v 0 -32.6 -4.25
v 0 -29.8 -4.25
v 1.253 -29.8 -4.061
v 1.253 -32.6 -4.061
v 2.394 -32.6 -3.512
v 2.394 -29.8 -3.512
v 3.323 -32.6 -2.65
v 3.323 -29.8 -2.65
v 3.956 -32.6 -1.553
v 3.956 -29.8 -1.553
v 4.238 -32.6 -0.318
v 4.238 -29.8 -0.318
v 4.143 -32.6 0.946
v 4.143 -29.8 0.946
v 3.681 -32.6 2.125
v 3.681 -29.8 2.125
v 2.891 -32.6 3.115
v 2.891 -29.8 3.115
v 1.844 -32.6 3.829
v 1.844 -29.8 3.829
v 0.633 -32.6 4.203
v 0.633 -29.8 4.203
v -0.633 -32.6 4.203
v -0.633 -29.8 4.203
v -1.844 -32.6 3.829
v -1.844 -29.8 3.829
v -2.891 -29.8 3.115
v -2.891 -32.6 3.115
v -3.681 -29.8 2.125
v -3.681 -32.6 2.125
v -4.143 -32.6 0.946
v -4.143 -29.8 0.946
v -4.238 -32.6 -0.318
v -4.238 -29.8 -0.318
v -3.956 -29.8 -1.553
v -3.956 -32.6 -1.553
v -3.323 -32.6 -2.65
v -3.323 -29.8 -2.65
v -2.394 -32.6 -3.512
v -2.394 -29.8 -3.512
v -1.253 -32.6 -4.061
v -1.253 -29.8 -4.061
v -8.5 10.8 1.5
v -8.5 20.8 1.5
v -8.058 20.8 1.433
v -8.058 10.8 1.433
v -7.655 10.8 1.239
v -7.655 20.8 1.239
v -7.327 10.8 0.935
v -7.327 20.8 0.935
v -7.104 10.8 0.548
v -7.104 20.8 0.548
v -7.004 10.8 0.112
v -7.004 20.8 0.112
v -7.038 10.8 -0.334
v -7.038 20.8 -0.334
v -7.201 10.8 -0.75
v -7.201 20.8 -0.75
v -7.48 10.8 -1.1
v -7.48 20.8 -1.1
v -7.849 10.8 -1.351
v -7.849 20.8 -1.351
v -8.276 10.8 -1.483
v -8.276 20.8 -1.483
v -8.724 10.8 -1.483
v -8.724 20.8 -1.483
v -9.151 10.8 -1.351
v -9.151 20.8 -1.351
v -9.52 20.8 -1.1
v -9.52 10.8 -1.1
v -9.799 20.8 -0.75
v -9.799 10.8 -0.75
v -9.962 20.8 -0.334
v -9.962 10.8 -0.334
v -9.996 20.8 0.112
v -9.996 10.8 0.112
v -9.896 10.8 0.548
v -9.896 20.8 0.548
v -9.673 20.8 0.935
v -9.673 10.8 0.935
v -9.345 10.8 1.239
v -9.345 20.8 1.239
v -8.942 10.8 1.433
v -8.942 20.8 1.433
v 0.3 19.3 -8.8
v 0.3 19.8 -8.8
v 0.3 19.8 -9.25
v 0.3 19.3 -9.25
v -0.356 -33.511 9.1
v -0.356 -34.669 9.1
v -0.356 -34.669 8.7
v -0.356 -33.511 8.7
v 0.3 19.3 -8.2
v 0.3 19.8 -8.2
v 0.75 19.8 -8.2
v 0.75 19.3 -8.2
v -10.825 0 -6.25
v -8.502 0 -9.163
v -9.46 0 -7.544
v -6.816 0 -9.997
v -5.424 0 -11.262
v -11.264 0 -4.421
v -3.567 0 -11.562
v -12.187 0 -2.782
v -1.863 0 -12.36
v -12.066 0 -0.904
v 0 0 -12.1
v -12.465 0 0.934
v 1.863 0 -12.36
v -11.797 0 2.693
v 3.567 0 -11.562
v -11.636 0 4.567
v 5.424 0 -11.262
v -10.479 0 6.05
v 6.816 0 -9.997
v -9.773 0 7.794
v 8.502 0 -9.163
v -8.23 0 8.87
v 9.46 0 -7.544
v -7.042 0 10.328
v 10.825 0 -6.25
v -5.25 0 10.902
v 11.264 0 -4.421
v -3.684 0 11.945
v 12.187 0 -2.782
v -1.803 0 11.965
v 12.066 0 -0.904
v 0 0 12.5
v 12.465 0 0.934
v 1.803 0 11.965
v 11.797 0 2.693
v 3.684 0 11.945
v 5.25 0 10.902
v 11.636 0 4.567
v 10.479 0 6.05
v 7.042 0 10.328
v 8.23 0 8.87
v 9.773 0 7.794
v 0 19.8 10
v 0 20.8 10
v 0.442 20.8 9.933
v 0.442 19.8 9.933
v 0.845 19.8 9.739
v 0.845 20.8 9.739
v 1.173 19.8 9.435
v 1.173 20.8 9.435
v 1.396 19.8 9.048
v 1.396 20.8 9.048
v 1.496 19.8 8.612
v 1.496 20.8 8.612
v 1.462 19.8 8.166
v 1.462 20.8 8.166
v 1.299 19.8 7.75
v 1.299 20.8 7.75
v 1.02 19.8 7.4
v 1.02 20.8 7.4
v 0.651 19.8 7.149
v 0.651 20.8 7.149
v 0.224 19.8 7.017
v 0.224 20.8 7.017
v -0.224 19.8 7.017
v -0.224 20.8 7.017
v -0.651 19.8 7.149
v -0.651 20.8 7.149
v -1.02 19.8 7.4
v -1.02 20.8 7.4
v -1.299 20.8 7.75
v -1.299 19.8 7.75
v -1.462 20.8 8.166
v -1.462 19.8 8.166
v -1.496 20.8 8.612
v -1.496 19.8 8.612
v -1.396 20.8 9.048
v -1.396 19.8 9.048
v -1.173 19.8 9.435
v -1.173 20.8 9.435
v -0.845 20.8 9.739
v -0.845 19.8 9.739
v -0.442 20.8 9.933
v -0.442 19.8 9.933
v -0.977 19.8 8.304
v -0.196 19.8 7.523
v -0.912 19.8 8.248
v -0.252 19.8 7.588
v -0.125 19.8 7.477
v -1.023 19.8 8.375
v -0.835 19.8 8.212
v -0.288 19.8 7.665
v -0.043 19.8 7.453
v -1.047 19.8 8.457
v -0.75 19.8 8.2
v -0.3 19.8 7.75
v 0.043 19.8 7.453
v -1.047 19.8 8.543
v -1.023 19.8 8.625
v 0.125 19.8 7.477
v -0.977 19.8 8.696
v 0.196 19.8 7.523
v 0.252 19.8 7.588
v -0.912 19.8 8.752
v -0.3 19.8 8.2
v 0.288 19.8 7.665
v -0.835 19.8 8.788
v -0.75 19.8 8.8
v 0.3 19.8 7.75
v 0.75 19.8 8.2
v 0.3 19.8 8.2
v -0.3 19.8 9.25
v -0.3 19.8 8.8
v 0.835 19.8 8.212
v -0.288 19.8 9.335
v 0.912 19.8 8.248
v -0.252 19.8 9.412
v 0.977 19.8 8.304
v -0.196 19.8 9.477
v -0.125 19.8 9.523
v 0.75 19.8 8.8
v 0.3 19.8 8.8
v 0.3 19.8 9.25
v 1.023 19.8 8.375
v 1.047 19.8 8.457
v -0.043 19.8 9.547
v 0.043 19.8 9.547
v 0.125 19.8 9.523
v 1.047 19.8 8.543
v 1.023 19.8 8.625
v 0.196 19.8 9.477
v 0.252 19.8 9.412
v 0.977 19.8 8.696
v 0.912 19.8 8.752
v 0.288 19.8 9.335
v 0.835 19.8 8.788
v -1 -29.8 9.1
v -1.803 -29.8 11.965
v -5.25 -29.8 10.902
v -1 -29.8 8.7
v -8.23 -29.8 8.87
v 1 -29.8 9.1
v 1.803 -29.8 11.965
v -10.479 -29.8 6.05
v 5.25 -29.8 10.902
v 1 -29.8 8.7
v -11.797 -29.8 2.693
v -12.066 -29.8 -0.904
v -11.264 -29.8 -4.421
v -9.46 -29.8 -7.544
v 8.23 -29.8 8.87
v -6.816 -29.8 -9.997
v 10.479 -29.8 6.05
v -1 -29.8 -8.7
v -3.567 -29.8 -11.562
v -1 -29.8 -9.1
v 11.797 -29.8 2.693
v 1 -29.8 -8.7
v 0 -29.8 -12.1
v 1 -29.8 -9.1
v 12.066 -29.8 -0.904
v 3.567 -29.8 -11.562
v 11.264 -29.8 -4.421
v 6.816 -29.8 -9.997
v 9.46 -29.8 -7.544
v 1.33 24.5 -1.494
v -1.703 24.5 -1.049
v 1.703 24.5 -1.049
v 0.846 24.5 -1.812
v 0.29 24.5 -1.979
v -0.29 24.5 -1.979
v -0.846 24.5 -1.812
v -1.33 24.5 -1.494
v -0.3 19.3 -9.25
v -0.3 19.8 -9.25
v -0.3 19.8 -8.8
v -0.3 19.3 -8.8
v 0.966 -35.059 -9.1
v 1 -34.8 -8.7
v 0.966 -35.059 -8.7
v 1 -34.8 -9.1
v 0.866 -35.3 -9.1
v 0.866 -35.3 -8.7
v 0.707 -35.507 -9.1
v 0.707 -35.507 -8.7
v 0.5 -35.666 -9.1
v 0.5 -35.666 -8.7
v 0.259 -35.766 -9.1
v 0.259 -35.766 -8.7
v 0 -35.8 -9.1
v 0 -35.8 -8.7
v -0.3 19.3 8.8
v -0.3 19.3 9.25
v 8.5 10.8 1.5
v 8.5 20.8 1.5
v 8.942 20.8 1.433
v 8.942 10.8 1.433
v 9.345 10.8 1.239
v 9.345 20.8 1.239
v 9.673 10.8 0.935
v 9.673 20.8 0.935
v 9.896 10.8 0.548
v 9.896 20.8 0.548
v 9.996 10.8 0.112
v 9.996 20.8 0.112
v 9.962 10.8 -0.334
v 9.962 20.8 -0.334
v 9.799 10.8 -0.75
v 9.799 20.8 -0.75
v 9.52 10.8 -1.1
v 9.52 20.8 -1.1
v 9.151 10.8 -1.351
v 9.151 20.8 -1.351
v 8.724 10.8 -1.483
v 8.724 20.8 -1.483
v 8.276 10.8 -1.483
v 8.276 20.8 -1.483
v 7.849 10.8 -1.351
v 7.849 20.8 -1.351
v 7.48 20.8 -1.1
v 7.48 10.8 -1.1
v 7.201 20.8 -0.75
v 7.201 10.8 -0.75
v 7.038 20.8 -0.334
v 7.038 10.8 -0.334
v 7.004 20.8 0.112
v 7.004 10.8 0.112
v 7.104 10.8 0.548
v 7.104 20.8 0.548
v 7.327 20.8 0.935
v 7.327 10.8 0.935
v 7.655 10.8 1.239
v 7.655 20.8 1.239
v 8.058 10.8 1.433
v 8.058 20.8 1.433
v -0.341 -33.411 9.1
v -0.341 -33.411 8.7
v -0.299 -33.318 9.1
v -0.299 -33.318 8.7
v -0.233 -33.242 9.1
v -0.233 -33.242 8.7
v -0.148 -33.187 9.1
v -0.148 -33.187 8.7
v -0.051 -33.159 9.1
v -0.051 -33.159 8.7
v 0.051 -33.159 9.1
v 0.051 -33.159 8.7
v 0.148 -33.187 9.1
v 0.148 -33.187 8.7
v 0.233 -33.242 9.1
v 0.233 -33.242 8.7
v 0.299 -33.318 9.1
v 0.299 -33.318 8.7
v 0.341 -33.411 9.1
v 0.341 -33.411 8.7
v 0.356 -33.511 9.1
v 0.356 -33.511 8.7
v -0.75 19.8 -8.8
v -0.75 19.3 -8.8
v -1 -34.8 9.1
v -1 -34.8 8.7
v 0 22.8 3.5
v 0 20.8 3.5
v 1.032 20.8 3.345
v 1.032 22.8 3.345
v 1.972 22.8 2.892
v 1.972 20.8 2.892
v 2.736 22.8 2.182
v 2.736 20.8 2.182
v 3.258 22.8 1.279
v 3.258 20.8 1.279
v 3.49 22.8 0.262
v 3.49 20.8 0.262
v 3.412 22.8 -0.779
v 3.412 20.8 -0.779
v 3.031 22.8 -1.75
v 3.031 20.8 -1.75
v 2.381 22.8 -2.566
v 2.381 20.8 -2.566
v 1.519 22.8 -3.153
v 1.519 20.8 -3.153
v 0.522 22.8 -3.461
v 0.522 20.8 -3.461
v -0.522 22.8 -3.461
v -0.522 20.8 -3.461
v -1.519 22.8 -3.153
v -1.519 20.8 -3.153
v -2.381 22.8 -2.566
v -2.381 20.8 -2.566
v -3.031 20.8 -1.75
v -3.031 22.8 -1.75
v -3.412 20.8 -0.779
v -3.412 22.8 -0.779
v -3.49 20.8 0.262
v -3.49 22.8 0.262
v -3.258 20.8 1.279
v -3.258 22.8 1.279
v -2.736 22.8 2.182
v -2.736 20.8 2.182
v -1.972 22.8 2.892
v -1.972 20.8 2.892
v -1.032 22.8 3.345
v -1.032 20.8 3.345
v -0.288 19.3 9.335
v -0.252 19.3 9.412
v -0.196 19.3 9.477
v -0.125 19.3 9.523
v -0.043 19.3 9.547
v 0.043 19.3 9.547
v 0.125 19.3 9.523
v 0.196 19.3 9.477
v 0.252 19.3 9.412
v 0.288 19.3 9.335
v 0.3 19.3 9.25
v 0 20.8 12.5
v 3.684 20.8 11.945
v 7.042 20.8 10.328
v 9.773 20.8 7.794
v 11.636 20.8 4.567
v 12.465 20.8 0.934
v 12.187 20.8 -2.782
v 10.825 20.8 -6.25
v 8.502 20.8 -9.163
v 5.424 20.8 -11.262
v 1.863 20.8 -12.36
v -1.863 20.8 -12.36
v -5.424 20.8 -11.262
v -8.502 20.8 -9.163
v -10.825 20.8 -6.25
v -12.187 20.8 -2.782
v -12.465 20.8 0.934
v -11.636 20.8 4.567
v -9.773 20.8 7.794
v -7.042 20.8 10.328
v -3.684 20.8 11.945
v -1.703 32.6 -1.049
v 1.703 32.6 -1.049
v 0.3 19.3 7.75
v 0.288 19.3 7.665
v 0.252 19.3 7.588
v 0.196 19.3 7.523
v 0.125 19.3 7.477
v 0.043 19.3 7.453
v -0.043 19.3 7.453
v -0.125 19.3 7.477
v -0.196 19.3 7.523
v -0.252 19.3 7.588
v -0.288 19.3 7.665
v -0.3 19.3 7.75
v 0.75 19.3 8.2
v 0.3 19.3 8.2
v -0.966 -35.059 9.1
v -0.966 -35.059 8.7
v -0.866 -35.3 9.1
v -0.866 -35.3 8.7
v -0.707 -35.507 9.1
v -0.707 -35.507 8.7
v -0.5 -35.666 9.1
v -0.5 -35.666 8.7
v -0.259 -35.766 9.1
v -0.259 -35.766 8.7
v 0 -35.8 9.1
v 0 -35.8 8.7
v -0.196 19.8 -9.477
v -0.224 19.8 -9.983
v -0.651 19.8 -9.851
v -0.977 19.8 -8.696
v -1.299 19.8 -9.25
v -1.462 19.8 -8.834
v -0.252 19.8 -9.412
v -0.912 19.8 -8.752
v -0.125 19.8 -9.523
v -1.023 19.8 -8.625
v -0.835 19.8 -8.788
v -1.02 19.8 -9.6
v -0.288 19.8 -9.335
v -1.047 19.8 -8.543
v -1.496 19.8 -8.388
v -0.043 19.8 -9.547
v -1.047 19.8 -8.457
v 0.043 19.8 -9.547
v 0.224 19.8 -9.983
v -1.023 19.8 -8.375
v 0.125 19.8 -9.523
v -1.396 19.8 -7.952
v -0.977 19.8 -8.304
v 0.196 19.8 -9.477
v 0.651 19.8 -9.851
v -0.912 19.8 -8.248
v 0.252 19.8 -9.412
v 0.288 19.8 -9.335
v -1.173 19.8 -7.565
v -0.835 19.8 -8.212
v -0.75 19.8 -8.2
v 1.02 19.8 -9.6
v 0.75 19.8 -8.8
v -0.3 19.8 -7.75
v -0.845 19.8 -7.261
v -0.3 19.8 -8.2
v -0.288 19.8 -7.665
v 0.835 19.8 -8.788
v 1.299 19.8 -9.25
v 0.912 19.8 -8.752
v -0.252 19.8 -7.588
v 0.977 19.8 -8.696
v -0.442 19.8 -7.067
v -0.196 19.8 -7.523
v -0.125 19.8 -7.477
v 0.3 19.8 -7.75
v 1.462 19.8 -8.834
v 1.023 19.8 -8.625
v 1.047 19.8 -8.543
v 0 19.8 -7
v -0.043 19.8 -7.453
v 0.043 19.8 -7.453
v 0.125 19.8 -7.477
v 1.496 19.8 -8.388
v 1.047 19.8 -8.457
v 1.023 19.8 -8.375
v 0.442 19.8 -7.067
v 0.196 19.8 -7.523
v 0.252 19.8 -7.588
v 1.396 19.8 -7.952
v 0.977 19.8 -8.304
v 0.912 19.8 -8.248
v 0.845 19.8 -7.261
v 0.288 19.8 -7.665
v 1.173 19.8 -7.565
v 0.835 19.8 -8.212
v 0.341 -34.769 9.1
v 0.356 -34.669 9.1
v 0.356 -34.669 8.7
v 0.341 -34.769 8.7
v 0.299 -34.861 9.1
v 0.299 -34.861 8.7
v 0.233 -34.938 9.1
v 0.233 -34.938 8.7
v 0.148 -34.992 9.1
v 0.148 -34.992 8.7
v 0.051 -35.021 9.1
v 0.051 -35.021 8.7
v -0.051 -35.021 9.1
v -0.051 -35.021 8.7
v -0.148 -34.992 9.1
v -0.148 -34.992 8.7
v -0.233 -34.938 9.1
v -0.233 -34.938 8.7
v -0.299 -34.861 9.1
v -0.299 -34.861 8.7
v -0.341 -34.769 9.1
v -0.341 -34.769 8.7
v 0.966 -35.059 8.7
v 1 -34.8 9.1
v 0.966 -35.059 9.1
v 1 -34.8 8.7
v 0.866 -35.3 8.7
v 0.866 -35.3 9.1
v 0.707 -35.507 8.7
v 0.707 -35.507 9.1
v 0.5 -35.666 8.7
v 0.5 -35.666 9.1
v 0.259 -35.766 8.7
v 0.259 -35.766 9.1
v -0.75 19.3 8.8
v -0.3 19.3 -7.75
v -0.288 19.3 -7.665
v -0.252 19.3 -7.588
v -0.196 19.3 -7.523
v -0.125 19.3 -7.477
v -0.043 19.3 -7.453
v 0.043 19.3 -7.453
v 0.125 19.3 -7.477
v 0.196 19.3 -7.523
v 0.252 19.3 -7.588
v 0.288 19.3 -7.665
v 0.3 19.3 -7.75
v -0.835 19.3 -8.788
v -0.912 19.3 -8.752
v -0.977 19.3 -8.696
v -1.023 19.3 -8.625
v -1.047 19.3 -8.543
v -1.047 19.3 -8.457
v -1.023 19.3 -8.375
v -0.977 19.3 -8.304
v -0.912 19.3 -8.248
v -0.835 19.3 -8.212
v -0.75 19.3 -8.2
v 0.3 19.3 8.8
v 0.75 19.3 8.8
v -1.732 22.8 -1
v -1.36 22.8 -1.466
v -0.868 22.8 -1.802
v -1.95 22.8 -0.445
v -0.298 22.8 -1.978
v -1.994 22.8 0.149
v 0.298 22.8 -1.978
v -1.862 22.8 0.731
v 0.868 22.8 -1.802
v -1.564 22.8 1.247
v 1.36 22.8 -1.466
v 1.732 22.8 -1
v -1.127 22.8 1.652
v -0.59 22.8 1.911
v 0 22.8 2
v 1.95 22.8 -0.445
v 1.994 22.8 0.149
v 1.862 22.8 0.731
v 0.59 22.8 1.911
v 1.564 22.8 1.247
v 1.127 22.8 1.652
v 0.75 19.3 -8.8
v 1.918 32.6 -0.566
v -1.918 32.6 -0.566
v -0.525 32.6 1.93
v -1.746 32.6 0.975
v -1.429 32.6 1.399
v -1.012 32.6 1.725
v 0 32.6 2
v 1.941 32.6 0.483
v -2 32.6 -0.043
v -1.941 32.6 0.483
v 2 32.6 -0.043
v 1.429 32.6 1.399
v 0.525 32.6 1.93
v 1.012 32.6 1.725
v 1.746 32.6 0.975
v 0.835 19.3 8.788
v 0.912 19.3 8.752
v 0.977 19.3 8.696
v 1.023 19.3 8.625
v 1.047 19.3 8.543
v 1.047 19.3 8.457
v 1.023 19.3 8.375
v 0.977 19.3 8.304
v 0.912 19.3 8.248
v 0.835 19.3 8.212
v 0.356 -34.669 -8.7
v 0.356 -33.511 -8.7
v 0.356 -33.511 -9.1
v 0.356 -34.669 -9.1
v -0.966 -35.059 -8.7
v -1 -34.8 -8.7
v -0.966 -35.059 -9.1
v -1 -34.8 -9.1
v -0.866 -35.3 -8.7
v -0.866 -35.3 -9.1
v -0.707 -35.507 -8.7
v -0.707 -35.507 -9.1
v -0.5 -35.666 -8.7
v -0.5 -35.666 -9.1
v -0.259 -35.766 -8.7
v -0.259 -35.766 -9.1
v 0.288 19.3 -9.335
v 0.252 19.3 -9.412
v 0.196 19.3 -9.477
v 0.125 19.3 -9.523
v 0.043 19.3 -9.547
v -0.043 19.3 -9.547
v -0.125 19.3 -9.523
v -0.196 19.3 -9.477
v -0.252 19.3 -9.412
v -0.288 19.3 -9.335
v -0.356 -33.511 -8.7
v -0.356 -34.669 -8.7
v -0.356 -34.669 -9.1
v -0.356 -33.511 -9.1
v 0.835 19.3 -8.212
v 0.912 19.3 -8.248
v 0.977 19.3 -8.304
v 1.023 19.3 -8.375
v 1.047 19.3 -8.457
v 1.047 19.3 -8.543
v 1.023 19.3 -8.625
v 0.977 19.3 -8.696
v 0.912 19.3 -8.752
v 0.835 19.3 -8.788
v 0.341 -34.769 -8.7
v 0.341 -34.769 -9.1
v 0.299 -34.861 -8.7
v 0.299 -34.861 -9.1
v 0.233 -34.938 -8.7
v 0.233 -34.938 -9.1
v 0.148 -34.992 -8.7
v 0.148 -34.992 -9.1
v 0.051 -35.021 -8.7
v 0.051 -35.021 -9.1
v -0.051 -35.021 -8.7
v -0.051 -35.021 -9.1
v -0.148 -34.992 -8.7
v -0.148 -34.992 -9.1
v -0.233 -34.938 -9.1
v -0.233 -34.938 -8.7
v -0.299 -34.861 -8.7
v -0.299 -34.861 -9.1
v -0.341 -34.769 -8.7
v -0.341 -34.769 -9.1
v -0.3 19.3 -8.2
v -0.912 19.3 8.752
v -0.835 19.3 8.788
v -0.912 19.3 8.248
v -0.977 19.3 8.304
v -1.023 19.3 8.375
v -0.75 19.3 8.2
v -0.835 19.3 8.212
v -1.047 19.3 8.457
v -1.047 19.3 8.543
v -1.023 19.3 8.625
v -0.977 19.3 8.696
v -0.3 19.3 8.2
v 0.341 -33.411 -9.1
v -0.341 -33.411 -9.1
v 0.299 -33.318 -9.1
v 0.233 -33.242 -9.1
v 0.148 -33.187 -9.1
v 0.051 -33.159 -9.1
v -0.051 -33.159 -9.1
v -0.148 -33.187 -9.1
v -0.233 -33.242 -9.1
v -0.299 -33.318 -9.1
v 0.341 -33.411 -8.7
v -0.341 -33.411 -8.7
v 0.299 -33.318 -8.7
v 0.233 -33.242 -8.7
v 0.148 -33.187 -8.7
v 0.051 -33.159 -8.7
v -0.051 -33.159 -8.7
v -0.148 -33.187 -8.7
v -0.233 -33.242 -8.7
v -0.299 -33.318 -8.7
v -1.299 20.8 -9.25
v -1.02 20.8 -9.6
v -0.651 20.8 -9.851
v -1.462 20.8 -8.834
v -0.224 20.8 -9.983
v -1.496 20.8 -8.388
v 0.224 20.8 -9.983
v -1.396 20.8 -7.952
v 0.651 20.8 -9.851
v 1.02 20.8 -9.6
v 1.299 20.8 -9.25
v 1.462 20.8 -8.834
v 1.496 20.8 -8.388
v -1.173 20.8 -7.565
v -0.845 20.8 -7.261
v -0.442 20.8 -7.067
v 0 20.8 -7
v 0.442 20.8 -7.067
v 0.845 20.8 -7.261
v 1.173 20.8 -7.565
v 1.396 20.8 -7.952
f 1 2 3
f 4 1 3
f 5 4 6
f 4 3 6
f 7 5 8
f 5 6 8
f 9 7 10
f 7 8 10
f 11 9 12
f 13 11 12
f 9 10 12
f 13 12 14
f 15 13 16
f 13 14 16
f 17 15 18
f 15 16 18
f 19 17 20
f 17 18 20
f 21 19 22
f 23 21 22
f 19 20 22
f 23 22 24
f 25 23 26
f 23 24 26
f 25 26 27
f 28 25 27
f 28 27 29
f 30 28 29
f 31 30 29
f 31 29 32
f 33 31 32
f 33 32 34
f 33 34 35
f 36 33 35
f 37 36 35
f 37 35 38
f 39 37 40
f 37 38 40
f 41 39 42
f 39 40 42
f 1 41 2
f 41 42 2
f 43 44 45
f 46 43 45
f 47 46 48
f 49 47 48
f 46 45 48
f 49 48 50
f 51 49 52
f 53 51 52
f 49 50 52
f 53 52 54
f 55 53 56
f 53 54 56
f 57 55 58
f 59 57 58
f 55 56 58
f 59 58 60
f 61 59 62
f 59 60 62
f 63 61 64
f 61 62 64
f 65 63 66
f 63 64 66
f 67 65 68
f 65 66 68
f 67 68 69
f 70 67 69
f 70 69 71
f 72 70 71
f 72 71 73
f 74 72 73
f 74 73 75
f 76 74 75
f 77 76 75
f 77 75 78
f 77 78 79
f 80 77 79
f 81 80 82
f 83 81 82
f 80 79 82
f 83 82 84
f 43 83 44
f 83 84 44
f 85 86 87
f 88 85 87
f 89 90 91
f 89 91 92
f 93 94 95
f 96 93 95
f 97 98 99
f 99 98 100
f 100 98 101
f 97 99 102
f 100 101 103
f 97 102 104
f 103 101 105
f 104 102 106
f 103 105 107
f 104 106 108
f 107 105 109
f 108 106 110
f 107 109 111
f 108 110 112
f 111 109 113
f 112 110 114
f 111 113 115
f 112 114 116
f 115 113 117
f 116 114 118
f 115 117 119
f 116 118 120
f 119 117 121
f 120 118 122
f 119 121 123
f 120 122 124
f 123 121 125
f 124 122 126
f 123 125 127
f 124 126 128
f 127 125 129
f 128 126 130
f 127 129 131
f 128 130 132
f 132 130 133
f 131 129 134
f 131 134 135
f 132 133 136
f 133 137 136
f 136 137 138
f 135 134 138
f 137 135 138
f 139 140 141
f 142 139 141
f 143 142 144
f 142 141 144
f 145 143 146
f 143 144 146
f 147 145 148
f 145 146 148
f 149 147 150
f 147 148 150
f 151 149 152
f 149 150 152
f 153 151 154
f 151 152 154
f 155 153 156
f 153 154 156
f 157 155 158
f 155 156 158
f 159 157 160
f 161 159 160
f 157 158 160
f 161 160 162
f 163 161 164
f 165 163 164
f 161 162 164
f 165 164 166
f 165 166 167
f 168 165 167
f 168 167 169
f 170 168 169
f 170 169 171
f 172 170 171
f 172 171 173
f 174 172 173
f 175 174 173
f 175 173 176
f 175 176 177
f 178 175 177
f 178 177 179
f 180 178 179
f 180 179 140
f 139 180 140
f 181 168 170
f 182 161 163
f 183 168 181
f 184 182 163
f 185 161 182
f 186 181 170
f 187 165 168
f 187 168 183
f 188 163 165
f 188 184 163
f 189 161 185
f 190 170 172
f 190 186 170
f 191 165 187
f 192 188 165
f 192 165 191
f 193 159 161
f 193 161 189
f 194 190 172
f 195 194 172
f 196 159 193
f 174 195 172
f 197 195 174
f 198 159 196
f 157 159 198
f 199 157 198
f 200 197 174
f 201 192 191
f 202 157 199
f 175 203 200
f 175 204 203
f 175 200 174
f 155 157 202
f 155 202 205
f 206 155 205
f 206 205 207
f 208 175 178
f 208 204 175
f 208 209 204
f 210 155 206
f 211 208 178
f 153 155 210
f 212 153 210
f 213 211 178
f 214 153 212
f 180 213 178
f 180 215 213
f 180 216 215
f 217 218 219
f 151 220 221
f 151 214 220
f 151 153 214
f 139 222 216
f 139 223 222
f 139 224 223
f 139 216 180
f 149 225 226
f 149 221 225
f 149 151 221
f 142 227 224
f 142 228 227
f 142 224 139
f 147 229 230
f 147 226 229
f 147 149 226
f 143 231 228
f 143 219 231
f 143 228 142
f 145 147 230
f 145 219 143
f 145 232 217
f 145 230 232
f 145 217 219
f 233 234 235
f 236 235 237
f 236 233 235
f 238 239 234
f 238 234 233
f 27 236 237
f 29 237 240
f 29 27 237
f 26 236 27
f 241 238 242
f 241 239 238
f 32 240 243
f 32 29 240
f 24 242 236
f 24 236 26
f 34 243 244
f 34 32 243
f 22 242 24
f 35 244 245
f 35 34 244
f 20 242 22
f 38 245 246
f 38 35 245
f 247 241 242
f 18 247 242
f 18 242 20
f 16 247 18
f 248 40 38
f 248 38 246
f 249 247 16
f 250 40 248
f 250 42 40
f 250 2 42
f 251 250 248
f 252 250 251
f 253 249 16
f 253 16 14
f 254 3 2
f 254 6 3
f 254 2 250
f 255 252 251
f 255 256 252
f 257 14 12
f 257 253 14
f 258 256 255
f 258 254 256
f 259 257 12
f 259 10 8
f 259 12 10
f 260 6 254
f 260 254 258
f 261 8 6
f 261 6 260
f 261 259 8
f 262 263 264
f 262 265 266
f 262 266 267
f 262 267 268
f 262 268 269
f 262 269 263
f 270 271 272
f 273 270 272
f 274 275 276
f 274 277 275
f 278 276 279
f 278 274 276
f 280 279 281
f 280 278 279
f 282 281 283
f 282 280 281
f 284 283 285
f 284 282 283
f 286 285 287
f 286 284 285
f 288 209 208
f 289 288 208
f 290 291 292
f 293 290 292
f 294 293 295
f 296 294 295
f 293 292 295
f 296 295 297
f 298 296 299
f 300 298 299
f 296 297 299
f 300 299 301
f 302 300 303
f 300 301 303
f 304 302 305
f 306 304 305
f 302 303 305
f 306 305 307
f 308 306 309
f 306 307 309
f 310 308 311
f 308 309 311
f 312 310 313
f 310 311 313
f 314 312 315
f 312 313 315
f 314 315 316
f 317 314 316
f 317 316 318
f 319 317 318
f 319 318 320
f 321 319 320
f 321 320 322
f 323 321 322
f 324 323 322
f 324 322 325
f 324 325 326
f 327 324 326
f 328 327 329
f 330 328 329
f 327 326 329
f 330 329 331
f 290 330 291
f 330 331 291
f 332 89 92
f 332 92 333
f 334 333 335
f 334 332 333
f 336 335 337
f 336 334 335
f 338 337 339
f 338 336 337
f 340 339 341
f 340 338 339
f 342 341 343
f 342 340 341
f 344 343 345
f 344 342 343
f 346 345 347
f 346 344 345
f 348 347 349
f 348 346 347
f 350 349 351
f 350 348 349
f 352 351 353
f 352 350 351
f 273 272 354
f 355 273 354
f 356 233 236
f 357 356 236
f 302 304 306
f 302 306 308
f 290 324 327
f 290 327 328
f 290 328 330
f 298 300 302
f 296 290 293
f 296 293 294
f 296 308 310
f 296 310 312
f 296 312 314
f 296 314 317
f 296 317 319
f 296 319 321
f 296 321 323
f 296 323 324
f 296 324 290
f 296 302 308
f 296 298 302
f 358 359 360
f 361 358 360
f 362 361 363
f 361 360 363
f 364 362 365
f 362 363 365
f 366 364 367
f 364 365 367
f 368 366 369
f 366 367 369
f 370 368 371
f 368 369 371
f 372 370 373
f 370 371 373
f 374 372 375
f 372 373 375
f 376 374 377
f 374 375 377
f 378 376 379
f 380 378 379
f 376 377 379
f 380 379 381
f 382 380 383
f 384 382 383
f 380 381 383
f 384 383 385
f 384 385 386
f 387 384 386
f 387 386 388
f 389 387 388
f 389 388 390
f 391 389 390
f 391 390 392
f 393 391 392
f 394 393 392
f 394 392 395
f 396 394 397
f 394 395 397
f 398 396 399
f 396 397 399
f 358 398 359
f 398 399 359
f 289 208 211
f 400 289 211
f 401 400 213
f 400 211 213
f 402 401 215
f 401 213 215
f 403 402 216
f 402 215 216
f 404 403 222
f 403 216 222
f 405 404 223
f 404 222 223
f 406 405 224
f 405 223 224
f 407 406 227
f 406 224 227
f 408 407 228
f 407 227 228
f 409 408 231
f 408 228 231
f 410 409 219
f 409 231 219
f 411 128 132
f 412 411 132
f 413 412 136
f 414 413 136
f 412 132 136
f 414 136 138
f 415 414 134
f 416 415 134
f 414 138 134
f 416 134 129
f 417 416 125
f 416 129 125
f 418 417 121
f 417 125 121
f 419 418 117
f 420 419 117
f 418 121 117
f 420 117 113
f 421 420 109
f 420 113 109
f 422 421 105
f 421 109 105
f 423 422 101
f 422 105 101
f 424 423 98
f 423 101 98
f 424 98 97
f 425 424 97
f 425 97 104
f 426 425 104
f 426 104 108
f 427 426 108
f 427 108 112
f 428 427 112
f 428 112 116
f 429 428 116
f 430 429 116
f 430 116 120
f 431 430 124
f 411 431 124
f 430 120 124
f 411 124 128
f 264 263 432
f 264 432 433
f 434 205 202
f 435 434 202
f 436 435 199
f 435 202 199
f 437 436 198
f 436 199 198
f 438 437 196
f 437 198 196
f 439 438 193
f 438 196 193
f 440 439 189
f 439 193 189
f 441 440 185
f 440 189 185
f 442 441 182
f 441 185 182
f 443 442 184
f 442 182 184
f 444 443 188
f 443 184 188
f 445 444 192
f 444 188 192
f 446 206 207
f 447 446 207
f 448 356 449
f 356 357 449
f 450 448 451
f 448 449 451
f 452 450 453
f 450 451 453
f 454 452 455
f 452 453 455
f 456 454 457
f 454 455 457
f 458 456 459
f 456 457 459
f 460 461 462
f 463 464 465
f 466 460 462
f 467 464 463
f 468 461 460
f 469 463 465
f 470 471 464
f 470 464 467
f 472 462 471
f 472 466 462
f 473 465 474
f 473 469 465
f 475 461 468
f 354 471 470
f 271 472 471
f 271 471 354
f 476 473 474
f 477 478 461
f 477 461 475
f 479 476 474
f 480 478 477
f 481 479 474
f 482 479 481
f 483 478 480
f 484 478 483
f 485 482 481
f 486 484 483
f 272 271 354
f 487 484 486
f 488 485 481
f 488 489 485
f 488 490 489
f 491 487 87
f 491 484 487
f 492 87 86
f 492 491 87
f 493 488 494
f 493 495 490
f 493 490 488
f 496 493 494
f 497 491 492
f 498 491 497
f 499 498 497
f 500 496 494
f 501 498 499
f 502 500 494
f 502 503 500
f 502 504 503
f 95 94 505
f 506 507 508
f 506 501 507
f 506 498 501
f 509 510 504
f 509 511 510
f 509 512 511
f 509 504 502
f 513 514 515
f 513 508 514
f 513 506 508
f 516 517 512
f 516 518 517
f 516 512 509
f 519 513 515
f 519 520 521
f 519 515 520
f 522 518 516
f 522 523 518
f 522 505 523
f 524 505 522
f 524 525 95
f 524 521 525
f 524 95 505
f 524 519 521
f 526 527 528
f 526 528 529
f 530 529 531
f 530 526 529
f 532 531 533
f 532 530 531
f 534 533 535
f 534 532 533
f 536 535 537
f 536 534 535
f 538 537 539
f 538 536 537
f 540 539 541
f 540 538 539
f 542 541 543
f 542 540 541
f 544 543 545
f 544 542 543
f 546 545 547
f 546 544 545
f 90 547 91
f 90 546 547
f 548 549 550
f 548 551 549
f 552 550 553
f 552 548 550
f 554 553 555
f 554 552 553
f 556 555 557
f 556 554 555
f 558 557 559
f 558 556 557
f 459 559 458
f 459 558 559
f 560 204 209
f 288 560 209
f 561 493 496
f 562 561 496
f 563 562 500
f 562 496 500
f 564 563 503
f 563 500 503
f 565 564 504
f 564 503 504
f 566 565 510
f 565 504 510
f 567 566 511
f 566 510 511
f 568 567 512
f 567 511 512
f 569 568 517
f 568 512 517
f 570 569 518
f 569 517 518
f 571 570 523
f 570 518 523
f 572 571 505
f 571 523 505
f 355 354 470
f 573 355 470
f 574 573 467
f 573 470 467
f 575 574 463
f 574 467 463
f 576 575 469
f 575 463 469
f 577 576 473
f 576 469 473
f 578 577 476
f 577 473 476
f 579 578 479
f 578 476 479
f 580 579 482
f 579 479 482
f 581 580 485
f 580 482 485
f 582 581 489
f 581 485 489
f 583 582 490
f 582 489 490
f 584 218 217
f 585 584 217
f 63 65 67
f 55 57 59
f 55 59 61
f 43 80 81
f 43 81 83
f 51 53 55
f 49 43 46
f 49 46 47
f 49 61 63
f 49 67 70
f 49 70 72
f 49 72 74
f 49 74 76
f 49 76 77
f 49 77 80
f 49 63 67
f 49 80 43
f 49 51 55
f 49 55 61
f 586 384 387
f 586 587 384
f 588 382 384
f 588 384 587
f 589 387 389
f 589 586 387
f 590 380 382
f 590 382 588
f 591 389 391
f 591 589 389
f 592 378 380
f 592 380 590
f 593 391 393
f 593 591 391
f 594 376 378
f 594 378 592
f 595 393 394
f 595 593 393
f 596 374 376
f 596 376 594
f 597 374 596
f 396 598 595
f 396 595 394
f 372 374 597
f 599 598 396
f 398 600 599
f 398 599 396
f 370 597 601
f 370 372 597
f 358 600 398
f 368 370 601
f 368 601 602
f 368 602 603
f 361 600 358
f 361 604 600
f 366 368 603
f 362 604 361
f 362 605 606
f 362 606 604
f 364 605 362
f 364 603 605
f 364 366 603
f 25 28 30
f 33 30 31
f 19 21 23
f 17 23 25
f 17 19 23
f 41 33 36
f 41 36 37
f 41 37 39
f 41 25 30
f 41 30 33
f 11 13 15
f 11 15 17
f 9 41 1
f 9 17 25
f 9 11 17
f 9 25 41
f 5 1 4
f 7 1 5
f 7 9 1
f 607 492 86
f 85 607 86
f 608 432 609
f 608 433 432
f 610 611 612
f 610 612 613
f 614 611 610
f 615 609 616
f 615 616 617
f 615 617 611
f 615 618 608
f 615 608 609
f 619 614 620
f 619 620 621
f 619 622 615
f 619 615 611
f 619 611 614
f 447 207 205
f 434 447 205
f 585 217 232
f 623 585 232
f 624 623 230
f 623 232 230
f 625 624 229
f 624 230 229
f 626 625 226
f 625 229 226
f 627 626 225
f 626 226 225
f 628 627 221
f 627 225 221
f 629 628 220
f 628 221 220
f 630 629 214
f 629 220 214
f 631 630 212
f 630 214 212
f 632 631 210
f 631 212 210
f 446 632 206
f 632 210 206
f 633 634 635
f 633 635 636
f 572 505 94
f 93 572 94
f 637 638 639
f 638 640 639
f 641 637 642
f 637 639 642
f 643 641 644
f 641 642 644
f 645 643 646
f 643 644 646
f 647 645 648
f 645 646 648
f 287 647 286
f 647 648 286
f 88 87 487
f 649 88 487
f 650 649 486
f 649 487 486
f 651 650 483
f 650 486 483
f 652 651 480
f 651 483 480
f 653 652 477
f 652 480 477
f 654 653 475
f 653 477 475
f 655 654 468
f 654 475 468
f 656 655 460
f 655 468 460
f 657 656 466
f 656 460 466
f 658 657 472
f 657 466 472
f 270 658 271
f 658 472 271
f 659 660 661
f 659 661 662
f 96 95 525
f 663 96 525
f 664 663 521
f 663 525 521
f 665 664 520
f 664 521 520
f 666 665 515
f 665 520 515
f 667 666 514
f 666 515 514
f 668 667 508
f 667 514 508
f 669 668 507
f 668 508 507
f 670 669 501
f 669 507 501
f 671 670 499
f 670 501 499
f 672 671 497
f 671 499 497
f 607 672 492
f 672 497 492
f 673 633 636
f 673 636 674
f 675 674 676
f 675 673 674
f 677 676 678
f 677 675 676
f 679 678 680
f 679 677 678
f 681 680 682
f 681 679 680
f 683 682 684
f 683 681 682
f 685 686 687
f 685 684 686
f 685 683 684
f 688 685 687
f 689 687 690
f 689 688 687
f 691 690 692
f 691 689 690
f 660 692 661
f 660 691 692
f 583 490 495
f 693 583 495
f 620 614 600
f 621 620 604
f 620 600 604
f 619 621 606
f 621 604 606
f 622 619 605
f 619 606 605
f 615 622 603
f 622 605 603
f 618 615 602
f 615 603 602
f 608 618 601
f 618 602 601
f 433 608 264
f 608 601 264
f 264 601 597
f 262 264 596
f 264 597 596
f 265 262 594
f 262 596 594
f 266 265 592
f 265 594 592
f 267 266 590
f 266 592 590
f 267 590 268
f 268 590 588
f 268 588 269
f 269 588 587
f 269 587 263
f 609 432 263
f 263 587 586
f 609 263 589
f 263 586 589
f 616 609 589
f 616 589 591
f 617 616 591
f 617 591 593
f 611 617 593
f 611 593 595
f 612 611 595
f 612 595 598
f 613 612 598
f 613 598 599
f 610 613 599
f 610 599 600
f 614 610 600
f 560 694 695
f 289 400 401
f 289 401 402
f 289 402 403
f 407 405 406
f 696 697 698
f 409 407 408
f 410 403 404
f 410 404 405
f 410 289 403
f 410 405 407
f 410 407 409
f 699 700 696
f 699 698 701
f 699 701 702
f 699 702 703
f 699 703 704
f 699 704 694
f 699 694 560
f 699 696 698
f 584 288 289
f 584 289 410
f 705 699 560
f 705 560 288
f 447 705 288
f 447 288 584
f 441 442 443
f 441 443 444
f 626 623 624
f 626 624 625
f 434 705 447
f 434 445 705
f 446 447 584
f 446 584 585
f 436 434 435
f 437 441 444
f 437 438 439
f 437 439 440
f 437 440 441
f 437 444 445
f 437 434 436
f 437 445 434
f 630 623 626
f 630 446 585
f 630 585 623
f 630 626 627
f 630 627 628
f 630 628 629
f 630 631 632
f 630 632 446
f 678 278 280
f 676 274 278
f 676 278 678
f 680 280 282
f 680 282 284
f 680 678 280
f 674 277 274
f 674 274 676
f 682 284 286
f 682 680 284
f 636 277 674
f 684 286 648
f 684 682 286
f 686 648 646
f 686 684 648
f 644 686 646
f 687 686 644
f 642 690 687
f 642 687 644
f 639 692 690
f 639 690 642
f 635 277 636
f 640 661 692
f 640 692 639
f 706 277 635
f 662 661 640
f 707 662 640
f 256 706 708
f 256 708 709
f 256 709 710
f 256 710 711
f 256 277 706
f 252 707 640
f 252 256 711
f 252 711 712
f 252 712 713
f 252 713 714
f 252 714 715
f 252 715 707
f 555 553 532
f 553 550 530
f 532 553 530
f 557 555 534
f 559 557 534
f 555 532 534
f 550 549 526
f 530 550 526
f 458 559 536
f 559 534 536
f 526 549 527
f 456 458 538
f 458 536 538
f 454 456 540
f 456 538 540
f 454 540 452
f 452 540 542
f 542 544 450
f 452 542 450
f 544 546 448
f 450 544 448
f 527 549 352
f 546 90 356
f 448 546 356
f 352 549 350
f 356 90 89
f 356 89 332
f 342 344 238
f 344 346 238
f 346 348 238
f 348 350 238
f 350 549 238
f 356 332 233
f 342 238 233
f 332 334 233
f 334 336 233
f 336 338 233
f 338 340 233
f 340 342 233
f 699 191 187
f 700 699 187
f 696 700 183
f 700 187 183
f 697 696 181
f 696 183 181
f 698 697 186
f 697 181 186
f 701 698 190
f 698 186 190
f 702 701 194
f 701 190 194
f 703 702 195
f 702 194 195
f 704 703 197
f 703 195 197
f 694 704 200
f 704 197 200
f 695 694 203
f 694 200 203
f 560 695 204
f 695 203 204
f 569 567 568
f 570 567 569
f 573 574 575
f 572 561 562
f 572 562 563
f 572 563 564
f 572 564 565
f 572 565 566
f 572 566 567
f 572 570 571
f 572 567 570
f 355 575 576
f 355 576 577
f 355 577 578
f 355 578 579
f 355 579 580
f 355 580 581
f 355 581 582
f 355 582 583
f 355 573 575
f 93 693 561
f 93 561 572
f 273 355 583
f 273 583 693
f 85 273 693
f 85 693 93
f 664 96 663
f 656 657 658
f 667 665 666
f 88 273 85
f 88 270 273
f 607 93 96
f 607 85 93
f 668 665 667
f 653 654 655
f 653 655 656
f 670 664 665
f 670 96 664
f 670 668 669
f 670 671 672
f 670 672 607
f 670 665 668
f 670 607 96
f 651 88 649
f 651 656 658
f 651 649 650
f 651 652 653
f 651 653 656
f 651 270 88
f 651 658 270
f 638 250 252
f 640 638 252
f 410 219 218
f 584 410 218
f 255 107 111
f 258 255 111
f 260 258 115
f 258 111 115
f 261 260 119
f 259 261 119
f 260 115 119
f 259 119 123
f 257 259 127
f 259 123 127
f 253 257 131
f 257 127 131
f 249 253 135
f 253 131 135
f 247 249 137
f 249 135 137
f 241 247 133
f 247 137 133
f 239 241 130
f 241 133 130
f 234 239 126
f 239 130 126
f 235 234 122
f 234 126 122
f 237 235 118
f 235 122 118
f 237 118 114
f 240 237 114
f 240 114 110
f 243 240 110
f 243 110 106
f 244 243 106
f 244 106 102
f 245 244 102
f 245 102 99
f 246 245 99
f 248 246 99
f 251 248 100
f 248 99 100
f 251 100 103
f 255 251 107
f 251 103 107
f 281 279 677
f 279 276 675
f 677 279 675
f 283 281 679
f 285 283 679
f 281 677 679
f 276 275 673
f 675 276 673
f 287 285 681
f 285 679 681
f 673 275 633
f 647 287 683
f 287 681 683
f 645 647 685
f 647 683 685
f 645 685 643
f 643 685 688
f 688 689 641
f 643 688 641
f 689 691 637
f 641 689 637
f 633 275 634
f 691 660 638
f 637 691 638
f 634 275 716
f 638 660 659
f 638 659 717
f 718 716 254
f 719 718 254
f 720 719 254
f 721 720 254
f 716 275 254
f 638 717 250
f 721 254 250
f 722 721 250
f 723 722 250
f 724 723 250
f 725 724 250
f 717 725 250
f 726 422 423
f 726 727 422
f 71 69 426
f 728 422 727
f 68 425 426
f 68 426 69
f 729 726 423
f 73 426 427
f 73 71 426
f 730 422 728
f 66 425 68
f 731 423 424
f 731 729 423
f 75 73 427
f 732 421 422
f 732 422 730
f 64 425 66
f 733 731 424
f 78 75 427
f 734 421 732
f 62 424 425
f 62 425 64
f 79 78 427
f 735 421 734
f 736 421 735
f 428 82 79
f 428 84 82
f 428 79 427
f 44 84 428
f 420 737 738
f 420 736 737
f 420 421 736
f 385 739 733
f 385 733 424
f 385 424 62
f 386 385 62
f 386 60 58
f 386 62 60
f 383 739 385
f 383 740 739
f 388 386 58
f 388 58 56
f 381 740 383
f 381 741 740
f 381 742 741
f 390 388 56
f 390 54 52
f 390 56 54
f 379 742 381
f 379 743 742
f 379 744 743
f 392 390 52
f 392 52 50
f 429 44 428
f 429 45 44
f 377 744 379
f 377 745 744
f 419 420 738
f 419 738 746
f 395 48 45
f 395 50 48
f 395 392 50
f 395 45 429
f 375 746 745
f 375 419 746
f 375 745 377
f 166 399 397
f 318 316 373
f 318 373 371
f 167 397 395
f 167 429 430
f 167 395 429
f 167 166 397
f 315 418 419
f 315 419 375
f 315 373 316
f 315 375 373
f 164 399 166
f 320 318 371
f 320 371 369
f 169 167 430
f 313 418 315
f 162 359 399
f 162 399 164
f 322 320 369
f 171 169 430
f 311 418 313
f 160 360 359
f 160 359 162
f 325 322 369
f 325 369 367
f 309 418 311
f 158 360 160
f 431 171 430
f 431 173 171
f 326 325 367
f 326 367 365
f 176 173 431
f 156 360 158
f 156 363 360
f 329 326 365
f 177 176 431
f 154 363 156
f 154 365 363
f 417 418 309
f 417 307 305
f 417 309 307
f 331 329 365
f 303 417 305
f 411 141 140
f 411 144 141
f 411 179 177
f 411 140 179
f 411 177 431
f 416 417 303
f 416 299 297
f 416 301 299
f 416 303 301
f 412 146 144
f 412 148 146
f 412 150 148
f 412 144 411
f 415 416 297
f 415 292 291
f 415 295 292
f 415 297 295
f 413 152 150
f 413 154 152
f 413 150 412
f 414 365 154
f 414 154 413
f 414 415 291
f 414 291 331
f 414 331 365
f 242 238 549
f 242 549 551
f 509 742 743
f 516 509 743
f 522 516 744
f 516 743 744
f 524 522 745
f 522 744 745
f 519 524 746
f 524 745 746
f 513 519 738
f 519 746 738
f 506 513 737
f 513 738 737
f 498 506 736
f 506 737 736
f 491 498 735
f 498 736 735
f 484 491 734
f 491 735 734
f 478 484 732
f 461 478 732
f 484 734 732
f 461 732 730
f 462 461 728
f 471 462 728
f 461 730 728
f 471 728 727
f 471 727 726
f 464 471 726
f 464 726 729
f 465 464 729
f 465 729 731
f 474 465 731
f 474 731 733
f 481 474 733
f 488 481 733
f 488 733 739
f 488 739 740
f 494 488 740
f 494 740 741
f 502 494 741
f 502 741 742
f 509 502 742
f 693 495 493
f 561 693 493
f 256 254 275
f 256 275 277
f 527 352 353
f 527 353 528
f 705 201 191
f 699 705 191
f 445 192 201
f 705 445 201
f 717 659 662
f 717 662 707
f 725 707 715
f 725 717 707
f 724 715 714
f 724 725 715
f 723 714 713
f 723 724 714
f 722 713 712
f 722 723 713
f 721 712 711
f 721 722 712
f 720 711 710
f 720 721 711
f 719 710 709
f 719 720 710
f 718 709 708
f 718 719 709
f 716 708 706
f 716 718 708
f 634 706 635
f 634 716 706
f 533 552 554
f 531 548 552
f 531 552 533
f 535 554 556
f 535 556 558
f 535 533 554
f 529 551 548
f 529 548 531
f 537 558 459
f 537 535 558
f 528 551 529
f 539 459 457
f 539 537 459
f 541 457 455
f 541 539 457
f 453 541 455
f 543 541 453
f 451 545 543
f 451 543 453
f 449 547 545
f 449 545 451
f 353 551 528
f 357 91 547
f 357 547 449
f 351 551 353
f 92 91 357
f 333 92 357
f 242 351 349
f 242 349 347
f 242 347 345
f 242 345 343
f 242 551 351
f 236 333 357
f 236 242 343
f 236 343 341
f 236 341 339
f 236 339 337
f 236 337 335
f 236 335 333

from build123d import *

# Parameters (mm, degrees)
ESBO_O1_R                = 12.5
RESSALTO_EXTRUS_O1_DEPTH = 20.8
ESBO_O2_R                = 12.1
RESSALTO_EXTRUS_O2_DEPTH = 29.8
ESBO_O3_R                = 2
RESSALTO_EXTRUS_O3_DEPTH = 11.8
CORTE_EXTRUS_O1_START    = -8.1
CORTE_EXTRUS_O1_DEPTH    = 8.1
ESBO_O5_R                = 3.5
RESSALTO_EXTRUS_O4_DEPTH = 2
ESBO_O6_R                = 1.5
CORTE_EXTRUS_O2_DEPTH    = 10
RESSALTO_EXTRUS_O5_START = 9
ESBO_O8_R                = 1.5
RESSALTO_EXTRUS_O5_DEPTH = 9
CORTE_EXTRUS_O3_DEPTH    = 0.5
ESBO_O10_R               = 4.25
RESSALTO_EXTRUS_O6_DEPTH = 2.8
ESBO_O11_W               = 2
ESBO_O11_H               = 0.4
RESSALTO_EXTRUS_O8_DEPTH = 6
FILETE1_R                = 1
CORTE_EXTRUS_O4_DEPTH    = 22


with BuildPart() as part:
    # Esboço1 → Ressalto-extrusão1 (new body)
    with BuildSketch(Plane(origin=(0, 0, 0), x_dir=(1, 0, 0), z_dir=(0, 1, 0))):
        with Locations(Location((0, 0, 0), (0, 0, 270))):
            Circle(ESBO_O1_R)
    extrude(amount=RESSALTO_EXTRUS_O1_DEPTH)

    # Esboço2 → Ressalto-extrusão2 (add)
    with BuildSketch(Plane(origin=(0, 0, 0), x_dir=(-1, 0, 0), z_dir=(0, -1, 0))):
        with Locations(Location((0, 0, 0), (0, 0, 90))):
            Circle(ESBO_O2_R)
    extrude(amount=RESSALTO_EXTRUS_O2_DEPTH)

    # Esboço3 → Ressalto-extrusão3 (add)
    with BuildSketch(Plane(origin=(0, 20.8, 0), x_dir=(1, 0, 0), z_dir=(0, 1, 0))):
        with Locations(Location((0, 0, 0), (0, 0, 270))):
            Circle(ESBO_O3_R)
    extrude(amount=RESSALTO_EXTRUS_O3_DEPTH)

    # Esboço4 → Corte-extrusão1 (cut)
    with BuildSketch(Plane(origin=(0, 32.6, 0), x_dir=(1, 0, 0), z_dir=(0, 1, 0)).offset(CORTE_EXTRUS_O1_START)):
        with BuildLine():
            Line((-1.702650866, 1.049275955), (1.702650866, 1.049275955))
            ThreePointArc((1.702650866, 1.049275955), (0, 2), (-1.702650866, 1.049275955))
        make_face()
    extrude(amount=CORTE_EXTRUS_O1_DEPTH, mode=Mode.SUBTRACT)

    # Esboço5 → Ressalto-extrusão4 (add)
    with BuildSketch(Plane(origin=(0, 20.8, 0), x_dir=(1, 0, 0), z_dir=(0, 1, 0))):
        with Locations(Location((0, 0, 0), (0, 0, 270))):
            Circle(ESBO_O5_R)
    extrude(amount=RESSALTO_EXTRUS_O4_DEPTH)

    # Esboço6 → Corte-extrusão2 (cut)
    with BuildSketch(Plane(origin=(0, 20.8, 0), x_dir=(1, 0, 0), z_dir=(0, 1, 0))):
        with Locations(Location((0, 8.5, 0), (0, 0, 270))):
            Circle(ESBO_O6_R)
        with Locations(Location((8.5, 0, 0), (0, 0, 270))):
            Circle(ESBO_O6_R)
        with Locations(Location((0, -8.5, 0), (0, 0, 270))):
            Circle(ESBO_O6_R)
        with Locations(Location((-8.5, 0, 0), (0, 0, 270))):
            Circle(ESBO_O6_R)
    extrude(amount=-CORTE_EXTRUS_O2_DEPTH, mode=Mode.SUBTRACT)

    # Esboço8 → Ressalto-extrusão5 (add)
    with BuildSketch(Plane(origin=(0, 10.8, 0), x_dir=(1, 0, 0), z_dir=(0, 1, 0)).offset(RESSALTO_EXTRUS_O5_START)):
        with Locations(Location((0, 8.5, 0), (0, 0, 270))):
            Circle(ESBO_O8_R)
        with Locations(Location((0, -8.5, 0), (0, 0, 270))):
            Circle(ESBO_O8_R)
    extrude(amount=-RESSALTO_EXTRUS_O5_DEPTH)

    # Esboço9 → Corte-extrusão3 (cut)
    with BuildSketch(Plane(origin=(0, 19.8, 0), x_dir=(1, 0, 0), z_dir=(0, 1, 0))):
        with BuildLine():
            Line((-0.3, 8.2), (-0.3, 7.75))
            ThreePointArc((-0.3, 7.75), (0, 7.45), (0.3, 7.75))
            Line((0.3, 7.75), (0.3, 8.2))
            Line((0.3, 8.2), (0.75, 8.2))
            ThreePointArc((0.75, 8.2), (1.05, 8.5), (0.75, 8.8))
            Line((0.75, 8.8), (0.3, 8.8))
            Line((0.3, 8.8), (0.3, 9.25))
            ThreePointArc((0.3, 9.25), (0, 9.55), (-0.3, 9.25))
            Line((-0.3, 9.25), (-0.3, 8.8))
            Line((-0.3, 8.8), (-0.75, 8.8))
            ThreePointArc((-0.75, 8.8), (-1.05, 8.5), (-0.75, 8.2))
            Line((-0.75, 8.2), (-0.3, 8.2))
        make_face()
        with BuildLine():
            Line((0.3, -8.2), (0.3, -7.75))
            ThreePointArc((0.3, -7.75), (0, -7.45), (-0.3, -7.75))
            Line((-0.3, -7.75), (-0.3, -8.2))
            Line((-0.3, -8.2), (-0.75, -8.2))
            ThreePointArc((-0.75, -8.2), (-1.05, -8.5), (-0.75, -8.8))
            Line((-0.75, -8.8), (-0.3, -8.8))
            Line((-0.3, -8.8), (-0.3, -9.25))
            ThreePointArc((-0.3, -9.25), (0, -9.55), (0.3, -9.25))
            Line((0.3, -9.25), (0.3, -8.8))
            Line((0.3, -8.8), (0.75, -8.8))
            ThreePointArc((0.75, -8.8), (1.05, -8.5), (0.75, -8.2))
            Line((0.75, -8.2), (0.3, -8.2))
        make_face()
    extrude(amount=-CORTE_EXTRUS_O3_DEPTH, mode=Mode.SUBTRACT)

    # Esboço10 → Ressalto-extrusão6 (add)
    with BuildSketch(Plane.XZ.offset(29.8)):
        with Locations(Location((0, 0, 0), (0, 0, 270))):
            Circle(ESBO_O10_R)
    extrude(amount=RESSALTO_EXTRUS_O6_DEPTH)

    # Esboço11 → Ressalto-extrusão8 (add)
    with BuildSketch(Plane(origin=(0, -29.8, 0), x_dir=(-1, 0, 0), z_dir=(0, -1, 0))):
        with Locations((0, 8.9)):
            Rectangle(ESBO_O11_W, ESBO_O11_H)
        with Locations((0, -8.9)):
            Rectangle(ESBO_O11_W, ESBO_O11_H)
    extrude(amount=RESSALTO_EXTRUS_O8_DEPTH)

    # Filete1
    filete1_edges = [part.edges().sort_by_distance(p)[0] for p in [
        (1, -35.8, -8.9),
        (-1, -35.8, -8.9),
        (-1, -35.8, 8.9),
        (1, -35.8, 8.9),
    ]]
    fillet(filete1_edges, radius=FILETE1_R - 0.0001)  # a hair under: the kernel refuses the full size

    # Esboço12 → Corte-extrusão4 (cut)
    with BuildSketch(Plane.XY.offset(9.1)):
        with BuildLine():
            Line((0.355764182, -33.51076438), (0.355764182, -34.668869147))
            ThreePointArc((0.355764182, -34.668869147), (0, -35.024633329), (-0.355764182, -34.668869147))
            Line((-0.355764182, -34.668869147), (-0.355764182, -33.51076438))
            ThreePointArc((-0.355764182, -33.51076438), (0, -33.155000198), (0.355764182, -33.51076438))
        make_face()
    extrude(amount=-CORTE_EXTRUS_O4_DEPTH, mode=Mode.SUBTRACT)


solid = part.part
